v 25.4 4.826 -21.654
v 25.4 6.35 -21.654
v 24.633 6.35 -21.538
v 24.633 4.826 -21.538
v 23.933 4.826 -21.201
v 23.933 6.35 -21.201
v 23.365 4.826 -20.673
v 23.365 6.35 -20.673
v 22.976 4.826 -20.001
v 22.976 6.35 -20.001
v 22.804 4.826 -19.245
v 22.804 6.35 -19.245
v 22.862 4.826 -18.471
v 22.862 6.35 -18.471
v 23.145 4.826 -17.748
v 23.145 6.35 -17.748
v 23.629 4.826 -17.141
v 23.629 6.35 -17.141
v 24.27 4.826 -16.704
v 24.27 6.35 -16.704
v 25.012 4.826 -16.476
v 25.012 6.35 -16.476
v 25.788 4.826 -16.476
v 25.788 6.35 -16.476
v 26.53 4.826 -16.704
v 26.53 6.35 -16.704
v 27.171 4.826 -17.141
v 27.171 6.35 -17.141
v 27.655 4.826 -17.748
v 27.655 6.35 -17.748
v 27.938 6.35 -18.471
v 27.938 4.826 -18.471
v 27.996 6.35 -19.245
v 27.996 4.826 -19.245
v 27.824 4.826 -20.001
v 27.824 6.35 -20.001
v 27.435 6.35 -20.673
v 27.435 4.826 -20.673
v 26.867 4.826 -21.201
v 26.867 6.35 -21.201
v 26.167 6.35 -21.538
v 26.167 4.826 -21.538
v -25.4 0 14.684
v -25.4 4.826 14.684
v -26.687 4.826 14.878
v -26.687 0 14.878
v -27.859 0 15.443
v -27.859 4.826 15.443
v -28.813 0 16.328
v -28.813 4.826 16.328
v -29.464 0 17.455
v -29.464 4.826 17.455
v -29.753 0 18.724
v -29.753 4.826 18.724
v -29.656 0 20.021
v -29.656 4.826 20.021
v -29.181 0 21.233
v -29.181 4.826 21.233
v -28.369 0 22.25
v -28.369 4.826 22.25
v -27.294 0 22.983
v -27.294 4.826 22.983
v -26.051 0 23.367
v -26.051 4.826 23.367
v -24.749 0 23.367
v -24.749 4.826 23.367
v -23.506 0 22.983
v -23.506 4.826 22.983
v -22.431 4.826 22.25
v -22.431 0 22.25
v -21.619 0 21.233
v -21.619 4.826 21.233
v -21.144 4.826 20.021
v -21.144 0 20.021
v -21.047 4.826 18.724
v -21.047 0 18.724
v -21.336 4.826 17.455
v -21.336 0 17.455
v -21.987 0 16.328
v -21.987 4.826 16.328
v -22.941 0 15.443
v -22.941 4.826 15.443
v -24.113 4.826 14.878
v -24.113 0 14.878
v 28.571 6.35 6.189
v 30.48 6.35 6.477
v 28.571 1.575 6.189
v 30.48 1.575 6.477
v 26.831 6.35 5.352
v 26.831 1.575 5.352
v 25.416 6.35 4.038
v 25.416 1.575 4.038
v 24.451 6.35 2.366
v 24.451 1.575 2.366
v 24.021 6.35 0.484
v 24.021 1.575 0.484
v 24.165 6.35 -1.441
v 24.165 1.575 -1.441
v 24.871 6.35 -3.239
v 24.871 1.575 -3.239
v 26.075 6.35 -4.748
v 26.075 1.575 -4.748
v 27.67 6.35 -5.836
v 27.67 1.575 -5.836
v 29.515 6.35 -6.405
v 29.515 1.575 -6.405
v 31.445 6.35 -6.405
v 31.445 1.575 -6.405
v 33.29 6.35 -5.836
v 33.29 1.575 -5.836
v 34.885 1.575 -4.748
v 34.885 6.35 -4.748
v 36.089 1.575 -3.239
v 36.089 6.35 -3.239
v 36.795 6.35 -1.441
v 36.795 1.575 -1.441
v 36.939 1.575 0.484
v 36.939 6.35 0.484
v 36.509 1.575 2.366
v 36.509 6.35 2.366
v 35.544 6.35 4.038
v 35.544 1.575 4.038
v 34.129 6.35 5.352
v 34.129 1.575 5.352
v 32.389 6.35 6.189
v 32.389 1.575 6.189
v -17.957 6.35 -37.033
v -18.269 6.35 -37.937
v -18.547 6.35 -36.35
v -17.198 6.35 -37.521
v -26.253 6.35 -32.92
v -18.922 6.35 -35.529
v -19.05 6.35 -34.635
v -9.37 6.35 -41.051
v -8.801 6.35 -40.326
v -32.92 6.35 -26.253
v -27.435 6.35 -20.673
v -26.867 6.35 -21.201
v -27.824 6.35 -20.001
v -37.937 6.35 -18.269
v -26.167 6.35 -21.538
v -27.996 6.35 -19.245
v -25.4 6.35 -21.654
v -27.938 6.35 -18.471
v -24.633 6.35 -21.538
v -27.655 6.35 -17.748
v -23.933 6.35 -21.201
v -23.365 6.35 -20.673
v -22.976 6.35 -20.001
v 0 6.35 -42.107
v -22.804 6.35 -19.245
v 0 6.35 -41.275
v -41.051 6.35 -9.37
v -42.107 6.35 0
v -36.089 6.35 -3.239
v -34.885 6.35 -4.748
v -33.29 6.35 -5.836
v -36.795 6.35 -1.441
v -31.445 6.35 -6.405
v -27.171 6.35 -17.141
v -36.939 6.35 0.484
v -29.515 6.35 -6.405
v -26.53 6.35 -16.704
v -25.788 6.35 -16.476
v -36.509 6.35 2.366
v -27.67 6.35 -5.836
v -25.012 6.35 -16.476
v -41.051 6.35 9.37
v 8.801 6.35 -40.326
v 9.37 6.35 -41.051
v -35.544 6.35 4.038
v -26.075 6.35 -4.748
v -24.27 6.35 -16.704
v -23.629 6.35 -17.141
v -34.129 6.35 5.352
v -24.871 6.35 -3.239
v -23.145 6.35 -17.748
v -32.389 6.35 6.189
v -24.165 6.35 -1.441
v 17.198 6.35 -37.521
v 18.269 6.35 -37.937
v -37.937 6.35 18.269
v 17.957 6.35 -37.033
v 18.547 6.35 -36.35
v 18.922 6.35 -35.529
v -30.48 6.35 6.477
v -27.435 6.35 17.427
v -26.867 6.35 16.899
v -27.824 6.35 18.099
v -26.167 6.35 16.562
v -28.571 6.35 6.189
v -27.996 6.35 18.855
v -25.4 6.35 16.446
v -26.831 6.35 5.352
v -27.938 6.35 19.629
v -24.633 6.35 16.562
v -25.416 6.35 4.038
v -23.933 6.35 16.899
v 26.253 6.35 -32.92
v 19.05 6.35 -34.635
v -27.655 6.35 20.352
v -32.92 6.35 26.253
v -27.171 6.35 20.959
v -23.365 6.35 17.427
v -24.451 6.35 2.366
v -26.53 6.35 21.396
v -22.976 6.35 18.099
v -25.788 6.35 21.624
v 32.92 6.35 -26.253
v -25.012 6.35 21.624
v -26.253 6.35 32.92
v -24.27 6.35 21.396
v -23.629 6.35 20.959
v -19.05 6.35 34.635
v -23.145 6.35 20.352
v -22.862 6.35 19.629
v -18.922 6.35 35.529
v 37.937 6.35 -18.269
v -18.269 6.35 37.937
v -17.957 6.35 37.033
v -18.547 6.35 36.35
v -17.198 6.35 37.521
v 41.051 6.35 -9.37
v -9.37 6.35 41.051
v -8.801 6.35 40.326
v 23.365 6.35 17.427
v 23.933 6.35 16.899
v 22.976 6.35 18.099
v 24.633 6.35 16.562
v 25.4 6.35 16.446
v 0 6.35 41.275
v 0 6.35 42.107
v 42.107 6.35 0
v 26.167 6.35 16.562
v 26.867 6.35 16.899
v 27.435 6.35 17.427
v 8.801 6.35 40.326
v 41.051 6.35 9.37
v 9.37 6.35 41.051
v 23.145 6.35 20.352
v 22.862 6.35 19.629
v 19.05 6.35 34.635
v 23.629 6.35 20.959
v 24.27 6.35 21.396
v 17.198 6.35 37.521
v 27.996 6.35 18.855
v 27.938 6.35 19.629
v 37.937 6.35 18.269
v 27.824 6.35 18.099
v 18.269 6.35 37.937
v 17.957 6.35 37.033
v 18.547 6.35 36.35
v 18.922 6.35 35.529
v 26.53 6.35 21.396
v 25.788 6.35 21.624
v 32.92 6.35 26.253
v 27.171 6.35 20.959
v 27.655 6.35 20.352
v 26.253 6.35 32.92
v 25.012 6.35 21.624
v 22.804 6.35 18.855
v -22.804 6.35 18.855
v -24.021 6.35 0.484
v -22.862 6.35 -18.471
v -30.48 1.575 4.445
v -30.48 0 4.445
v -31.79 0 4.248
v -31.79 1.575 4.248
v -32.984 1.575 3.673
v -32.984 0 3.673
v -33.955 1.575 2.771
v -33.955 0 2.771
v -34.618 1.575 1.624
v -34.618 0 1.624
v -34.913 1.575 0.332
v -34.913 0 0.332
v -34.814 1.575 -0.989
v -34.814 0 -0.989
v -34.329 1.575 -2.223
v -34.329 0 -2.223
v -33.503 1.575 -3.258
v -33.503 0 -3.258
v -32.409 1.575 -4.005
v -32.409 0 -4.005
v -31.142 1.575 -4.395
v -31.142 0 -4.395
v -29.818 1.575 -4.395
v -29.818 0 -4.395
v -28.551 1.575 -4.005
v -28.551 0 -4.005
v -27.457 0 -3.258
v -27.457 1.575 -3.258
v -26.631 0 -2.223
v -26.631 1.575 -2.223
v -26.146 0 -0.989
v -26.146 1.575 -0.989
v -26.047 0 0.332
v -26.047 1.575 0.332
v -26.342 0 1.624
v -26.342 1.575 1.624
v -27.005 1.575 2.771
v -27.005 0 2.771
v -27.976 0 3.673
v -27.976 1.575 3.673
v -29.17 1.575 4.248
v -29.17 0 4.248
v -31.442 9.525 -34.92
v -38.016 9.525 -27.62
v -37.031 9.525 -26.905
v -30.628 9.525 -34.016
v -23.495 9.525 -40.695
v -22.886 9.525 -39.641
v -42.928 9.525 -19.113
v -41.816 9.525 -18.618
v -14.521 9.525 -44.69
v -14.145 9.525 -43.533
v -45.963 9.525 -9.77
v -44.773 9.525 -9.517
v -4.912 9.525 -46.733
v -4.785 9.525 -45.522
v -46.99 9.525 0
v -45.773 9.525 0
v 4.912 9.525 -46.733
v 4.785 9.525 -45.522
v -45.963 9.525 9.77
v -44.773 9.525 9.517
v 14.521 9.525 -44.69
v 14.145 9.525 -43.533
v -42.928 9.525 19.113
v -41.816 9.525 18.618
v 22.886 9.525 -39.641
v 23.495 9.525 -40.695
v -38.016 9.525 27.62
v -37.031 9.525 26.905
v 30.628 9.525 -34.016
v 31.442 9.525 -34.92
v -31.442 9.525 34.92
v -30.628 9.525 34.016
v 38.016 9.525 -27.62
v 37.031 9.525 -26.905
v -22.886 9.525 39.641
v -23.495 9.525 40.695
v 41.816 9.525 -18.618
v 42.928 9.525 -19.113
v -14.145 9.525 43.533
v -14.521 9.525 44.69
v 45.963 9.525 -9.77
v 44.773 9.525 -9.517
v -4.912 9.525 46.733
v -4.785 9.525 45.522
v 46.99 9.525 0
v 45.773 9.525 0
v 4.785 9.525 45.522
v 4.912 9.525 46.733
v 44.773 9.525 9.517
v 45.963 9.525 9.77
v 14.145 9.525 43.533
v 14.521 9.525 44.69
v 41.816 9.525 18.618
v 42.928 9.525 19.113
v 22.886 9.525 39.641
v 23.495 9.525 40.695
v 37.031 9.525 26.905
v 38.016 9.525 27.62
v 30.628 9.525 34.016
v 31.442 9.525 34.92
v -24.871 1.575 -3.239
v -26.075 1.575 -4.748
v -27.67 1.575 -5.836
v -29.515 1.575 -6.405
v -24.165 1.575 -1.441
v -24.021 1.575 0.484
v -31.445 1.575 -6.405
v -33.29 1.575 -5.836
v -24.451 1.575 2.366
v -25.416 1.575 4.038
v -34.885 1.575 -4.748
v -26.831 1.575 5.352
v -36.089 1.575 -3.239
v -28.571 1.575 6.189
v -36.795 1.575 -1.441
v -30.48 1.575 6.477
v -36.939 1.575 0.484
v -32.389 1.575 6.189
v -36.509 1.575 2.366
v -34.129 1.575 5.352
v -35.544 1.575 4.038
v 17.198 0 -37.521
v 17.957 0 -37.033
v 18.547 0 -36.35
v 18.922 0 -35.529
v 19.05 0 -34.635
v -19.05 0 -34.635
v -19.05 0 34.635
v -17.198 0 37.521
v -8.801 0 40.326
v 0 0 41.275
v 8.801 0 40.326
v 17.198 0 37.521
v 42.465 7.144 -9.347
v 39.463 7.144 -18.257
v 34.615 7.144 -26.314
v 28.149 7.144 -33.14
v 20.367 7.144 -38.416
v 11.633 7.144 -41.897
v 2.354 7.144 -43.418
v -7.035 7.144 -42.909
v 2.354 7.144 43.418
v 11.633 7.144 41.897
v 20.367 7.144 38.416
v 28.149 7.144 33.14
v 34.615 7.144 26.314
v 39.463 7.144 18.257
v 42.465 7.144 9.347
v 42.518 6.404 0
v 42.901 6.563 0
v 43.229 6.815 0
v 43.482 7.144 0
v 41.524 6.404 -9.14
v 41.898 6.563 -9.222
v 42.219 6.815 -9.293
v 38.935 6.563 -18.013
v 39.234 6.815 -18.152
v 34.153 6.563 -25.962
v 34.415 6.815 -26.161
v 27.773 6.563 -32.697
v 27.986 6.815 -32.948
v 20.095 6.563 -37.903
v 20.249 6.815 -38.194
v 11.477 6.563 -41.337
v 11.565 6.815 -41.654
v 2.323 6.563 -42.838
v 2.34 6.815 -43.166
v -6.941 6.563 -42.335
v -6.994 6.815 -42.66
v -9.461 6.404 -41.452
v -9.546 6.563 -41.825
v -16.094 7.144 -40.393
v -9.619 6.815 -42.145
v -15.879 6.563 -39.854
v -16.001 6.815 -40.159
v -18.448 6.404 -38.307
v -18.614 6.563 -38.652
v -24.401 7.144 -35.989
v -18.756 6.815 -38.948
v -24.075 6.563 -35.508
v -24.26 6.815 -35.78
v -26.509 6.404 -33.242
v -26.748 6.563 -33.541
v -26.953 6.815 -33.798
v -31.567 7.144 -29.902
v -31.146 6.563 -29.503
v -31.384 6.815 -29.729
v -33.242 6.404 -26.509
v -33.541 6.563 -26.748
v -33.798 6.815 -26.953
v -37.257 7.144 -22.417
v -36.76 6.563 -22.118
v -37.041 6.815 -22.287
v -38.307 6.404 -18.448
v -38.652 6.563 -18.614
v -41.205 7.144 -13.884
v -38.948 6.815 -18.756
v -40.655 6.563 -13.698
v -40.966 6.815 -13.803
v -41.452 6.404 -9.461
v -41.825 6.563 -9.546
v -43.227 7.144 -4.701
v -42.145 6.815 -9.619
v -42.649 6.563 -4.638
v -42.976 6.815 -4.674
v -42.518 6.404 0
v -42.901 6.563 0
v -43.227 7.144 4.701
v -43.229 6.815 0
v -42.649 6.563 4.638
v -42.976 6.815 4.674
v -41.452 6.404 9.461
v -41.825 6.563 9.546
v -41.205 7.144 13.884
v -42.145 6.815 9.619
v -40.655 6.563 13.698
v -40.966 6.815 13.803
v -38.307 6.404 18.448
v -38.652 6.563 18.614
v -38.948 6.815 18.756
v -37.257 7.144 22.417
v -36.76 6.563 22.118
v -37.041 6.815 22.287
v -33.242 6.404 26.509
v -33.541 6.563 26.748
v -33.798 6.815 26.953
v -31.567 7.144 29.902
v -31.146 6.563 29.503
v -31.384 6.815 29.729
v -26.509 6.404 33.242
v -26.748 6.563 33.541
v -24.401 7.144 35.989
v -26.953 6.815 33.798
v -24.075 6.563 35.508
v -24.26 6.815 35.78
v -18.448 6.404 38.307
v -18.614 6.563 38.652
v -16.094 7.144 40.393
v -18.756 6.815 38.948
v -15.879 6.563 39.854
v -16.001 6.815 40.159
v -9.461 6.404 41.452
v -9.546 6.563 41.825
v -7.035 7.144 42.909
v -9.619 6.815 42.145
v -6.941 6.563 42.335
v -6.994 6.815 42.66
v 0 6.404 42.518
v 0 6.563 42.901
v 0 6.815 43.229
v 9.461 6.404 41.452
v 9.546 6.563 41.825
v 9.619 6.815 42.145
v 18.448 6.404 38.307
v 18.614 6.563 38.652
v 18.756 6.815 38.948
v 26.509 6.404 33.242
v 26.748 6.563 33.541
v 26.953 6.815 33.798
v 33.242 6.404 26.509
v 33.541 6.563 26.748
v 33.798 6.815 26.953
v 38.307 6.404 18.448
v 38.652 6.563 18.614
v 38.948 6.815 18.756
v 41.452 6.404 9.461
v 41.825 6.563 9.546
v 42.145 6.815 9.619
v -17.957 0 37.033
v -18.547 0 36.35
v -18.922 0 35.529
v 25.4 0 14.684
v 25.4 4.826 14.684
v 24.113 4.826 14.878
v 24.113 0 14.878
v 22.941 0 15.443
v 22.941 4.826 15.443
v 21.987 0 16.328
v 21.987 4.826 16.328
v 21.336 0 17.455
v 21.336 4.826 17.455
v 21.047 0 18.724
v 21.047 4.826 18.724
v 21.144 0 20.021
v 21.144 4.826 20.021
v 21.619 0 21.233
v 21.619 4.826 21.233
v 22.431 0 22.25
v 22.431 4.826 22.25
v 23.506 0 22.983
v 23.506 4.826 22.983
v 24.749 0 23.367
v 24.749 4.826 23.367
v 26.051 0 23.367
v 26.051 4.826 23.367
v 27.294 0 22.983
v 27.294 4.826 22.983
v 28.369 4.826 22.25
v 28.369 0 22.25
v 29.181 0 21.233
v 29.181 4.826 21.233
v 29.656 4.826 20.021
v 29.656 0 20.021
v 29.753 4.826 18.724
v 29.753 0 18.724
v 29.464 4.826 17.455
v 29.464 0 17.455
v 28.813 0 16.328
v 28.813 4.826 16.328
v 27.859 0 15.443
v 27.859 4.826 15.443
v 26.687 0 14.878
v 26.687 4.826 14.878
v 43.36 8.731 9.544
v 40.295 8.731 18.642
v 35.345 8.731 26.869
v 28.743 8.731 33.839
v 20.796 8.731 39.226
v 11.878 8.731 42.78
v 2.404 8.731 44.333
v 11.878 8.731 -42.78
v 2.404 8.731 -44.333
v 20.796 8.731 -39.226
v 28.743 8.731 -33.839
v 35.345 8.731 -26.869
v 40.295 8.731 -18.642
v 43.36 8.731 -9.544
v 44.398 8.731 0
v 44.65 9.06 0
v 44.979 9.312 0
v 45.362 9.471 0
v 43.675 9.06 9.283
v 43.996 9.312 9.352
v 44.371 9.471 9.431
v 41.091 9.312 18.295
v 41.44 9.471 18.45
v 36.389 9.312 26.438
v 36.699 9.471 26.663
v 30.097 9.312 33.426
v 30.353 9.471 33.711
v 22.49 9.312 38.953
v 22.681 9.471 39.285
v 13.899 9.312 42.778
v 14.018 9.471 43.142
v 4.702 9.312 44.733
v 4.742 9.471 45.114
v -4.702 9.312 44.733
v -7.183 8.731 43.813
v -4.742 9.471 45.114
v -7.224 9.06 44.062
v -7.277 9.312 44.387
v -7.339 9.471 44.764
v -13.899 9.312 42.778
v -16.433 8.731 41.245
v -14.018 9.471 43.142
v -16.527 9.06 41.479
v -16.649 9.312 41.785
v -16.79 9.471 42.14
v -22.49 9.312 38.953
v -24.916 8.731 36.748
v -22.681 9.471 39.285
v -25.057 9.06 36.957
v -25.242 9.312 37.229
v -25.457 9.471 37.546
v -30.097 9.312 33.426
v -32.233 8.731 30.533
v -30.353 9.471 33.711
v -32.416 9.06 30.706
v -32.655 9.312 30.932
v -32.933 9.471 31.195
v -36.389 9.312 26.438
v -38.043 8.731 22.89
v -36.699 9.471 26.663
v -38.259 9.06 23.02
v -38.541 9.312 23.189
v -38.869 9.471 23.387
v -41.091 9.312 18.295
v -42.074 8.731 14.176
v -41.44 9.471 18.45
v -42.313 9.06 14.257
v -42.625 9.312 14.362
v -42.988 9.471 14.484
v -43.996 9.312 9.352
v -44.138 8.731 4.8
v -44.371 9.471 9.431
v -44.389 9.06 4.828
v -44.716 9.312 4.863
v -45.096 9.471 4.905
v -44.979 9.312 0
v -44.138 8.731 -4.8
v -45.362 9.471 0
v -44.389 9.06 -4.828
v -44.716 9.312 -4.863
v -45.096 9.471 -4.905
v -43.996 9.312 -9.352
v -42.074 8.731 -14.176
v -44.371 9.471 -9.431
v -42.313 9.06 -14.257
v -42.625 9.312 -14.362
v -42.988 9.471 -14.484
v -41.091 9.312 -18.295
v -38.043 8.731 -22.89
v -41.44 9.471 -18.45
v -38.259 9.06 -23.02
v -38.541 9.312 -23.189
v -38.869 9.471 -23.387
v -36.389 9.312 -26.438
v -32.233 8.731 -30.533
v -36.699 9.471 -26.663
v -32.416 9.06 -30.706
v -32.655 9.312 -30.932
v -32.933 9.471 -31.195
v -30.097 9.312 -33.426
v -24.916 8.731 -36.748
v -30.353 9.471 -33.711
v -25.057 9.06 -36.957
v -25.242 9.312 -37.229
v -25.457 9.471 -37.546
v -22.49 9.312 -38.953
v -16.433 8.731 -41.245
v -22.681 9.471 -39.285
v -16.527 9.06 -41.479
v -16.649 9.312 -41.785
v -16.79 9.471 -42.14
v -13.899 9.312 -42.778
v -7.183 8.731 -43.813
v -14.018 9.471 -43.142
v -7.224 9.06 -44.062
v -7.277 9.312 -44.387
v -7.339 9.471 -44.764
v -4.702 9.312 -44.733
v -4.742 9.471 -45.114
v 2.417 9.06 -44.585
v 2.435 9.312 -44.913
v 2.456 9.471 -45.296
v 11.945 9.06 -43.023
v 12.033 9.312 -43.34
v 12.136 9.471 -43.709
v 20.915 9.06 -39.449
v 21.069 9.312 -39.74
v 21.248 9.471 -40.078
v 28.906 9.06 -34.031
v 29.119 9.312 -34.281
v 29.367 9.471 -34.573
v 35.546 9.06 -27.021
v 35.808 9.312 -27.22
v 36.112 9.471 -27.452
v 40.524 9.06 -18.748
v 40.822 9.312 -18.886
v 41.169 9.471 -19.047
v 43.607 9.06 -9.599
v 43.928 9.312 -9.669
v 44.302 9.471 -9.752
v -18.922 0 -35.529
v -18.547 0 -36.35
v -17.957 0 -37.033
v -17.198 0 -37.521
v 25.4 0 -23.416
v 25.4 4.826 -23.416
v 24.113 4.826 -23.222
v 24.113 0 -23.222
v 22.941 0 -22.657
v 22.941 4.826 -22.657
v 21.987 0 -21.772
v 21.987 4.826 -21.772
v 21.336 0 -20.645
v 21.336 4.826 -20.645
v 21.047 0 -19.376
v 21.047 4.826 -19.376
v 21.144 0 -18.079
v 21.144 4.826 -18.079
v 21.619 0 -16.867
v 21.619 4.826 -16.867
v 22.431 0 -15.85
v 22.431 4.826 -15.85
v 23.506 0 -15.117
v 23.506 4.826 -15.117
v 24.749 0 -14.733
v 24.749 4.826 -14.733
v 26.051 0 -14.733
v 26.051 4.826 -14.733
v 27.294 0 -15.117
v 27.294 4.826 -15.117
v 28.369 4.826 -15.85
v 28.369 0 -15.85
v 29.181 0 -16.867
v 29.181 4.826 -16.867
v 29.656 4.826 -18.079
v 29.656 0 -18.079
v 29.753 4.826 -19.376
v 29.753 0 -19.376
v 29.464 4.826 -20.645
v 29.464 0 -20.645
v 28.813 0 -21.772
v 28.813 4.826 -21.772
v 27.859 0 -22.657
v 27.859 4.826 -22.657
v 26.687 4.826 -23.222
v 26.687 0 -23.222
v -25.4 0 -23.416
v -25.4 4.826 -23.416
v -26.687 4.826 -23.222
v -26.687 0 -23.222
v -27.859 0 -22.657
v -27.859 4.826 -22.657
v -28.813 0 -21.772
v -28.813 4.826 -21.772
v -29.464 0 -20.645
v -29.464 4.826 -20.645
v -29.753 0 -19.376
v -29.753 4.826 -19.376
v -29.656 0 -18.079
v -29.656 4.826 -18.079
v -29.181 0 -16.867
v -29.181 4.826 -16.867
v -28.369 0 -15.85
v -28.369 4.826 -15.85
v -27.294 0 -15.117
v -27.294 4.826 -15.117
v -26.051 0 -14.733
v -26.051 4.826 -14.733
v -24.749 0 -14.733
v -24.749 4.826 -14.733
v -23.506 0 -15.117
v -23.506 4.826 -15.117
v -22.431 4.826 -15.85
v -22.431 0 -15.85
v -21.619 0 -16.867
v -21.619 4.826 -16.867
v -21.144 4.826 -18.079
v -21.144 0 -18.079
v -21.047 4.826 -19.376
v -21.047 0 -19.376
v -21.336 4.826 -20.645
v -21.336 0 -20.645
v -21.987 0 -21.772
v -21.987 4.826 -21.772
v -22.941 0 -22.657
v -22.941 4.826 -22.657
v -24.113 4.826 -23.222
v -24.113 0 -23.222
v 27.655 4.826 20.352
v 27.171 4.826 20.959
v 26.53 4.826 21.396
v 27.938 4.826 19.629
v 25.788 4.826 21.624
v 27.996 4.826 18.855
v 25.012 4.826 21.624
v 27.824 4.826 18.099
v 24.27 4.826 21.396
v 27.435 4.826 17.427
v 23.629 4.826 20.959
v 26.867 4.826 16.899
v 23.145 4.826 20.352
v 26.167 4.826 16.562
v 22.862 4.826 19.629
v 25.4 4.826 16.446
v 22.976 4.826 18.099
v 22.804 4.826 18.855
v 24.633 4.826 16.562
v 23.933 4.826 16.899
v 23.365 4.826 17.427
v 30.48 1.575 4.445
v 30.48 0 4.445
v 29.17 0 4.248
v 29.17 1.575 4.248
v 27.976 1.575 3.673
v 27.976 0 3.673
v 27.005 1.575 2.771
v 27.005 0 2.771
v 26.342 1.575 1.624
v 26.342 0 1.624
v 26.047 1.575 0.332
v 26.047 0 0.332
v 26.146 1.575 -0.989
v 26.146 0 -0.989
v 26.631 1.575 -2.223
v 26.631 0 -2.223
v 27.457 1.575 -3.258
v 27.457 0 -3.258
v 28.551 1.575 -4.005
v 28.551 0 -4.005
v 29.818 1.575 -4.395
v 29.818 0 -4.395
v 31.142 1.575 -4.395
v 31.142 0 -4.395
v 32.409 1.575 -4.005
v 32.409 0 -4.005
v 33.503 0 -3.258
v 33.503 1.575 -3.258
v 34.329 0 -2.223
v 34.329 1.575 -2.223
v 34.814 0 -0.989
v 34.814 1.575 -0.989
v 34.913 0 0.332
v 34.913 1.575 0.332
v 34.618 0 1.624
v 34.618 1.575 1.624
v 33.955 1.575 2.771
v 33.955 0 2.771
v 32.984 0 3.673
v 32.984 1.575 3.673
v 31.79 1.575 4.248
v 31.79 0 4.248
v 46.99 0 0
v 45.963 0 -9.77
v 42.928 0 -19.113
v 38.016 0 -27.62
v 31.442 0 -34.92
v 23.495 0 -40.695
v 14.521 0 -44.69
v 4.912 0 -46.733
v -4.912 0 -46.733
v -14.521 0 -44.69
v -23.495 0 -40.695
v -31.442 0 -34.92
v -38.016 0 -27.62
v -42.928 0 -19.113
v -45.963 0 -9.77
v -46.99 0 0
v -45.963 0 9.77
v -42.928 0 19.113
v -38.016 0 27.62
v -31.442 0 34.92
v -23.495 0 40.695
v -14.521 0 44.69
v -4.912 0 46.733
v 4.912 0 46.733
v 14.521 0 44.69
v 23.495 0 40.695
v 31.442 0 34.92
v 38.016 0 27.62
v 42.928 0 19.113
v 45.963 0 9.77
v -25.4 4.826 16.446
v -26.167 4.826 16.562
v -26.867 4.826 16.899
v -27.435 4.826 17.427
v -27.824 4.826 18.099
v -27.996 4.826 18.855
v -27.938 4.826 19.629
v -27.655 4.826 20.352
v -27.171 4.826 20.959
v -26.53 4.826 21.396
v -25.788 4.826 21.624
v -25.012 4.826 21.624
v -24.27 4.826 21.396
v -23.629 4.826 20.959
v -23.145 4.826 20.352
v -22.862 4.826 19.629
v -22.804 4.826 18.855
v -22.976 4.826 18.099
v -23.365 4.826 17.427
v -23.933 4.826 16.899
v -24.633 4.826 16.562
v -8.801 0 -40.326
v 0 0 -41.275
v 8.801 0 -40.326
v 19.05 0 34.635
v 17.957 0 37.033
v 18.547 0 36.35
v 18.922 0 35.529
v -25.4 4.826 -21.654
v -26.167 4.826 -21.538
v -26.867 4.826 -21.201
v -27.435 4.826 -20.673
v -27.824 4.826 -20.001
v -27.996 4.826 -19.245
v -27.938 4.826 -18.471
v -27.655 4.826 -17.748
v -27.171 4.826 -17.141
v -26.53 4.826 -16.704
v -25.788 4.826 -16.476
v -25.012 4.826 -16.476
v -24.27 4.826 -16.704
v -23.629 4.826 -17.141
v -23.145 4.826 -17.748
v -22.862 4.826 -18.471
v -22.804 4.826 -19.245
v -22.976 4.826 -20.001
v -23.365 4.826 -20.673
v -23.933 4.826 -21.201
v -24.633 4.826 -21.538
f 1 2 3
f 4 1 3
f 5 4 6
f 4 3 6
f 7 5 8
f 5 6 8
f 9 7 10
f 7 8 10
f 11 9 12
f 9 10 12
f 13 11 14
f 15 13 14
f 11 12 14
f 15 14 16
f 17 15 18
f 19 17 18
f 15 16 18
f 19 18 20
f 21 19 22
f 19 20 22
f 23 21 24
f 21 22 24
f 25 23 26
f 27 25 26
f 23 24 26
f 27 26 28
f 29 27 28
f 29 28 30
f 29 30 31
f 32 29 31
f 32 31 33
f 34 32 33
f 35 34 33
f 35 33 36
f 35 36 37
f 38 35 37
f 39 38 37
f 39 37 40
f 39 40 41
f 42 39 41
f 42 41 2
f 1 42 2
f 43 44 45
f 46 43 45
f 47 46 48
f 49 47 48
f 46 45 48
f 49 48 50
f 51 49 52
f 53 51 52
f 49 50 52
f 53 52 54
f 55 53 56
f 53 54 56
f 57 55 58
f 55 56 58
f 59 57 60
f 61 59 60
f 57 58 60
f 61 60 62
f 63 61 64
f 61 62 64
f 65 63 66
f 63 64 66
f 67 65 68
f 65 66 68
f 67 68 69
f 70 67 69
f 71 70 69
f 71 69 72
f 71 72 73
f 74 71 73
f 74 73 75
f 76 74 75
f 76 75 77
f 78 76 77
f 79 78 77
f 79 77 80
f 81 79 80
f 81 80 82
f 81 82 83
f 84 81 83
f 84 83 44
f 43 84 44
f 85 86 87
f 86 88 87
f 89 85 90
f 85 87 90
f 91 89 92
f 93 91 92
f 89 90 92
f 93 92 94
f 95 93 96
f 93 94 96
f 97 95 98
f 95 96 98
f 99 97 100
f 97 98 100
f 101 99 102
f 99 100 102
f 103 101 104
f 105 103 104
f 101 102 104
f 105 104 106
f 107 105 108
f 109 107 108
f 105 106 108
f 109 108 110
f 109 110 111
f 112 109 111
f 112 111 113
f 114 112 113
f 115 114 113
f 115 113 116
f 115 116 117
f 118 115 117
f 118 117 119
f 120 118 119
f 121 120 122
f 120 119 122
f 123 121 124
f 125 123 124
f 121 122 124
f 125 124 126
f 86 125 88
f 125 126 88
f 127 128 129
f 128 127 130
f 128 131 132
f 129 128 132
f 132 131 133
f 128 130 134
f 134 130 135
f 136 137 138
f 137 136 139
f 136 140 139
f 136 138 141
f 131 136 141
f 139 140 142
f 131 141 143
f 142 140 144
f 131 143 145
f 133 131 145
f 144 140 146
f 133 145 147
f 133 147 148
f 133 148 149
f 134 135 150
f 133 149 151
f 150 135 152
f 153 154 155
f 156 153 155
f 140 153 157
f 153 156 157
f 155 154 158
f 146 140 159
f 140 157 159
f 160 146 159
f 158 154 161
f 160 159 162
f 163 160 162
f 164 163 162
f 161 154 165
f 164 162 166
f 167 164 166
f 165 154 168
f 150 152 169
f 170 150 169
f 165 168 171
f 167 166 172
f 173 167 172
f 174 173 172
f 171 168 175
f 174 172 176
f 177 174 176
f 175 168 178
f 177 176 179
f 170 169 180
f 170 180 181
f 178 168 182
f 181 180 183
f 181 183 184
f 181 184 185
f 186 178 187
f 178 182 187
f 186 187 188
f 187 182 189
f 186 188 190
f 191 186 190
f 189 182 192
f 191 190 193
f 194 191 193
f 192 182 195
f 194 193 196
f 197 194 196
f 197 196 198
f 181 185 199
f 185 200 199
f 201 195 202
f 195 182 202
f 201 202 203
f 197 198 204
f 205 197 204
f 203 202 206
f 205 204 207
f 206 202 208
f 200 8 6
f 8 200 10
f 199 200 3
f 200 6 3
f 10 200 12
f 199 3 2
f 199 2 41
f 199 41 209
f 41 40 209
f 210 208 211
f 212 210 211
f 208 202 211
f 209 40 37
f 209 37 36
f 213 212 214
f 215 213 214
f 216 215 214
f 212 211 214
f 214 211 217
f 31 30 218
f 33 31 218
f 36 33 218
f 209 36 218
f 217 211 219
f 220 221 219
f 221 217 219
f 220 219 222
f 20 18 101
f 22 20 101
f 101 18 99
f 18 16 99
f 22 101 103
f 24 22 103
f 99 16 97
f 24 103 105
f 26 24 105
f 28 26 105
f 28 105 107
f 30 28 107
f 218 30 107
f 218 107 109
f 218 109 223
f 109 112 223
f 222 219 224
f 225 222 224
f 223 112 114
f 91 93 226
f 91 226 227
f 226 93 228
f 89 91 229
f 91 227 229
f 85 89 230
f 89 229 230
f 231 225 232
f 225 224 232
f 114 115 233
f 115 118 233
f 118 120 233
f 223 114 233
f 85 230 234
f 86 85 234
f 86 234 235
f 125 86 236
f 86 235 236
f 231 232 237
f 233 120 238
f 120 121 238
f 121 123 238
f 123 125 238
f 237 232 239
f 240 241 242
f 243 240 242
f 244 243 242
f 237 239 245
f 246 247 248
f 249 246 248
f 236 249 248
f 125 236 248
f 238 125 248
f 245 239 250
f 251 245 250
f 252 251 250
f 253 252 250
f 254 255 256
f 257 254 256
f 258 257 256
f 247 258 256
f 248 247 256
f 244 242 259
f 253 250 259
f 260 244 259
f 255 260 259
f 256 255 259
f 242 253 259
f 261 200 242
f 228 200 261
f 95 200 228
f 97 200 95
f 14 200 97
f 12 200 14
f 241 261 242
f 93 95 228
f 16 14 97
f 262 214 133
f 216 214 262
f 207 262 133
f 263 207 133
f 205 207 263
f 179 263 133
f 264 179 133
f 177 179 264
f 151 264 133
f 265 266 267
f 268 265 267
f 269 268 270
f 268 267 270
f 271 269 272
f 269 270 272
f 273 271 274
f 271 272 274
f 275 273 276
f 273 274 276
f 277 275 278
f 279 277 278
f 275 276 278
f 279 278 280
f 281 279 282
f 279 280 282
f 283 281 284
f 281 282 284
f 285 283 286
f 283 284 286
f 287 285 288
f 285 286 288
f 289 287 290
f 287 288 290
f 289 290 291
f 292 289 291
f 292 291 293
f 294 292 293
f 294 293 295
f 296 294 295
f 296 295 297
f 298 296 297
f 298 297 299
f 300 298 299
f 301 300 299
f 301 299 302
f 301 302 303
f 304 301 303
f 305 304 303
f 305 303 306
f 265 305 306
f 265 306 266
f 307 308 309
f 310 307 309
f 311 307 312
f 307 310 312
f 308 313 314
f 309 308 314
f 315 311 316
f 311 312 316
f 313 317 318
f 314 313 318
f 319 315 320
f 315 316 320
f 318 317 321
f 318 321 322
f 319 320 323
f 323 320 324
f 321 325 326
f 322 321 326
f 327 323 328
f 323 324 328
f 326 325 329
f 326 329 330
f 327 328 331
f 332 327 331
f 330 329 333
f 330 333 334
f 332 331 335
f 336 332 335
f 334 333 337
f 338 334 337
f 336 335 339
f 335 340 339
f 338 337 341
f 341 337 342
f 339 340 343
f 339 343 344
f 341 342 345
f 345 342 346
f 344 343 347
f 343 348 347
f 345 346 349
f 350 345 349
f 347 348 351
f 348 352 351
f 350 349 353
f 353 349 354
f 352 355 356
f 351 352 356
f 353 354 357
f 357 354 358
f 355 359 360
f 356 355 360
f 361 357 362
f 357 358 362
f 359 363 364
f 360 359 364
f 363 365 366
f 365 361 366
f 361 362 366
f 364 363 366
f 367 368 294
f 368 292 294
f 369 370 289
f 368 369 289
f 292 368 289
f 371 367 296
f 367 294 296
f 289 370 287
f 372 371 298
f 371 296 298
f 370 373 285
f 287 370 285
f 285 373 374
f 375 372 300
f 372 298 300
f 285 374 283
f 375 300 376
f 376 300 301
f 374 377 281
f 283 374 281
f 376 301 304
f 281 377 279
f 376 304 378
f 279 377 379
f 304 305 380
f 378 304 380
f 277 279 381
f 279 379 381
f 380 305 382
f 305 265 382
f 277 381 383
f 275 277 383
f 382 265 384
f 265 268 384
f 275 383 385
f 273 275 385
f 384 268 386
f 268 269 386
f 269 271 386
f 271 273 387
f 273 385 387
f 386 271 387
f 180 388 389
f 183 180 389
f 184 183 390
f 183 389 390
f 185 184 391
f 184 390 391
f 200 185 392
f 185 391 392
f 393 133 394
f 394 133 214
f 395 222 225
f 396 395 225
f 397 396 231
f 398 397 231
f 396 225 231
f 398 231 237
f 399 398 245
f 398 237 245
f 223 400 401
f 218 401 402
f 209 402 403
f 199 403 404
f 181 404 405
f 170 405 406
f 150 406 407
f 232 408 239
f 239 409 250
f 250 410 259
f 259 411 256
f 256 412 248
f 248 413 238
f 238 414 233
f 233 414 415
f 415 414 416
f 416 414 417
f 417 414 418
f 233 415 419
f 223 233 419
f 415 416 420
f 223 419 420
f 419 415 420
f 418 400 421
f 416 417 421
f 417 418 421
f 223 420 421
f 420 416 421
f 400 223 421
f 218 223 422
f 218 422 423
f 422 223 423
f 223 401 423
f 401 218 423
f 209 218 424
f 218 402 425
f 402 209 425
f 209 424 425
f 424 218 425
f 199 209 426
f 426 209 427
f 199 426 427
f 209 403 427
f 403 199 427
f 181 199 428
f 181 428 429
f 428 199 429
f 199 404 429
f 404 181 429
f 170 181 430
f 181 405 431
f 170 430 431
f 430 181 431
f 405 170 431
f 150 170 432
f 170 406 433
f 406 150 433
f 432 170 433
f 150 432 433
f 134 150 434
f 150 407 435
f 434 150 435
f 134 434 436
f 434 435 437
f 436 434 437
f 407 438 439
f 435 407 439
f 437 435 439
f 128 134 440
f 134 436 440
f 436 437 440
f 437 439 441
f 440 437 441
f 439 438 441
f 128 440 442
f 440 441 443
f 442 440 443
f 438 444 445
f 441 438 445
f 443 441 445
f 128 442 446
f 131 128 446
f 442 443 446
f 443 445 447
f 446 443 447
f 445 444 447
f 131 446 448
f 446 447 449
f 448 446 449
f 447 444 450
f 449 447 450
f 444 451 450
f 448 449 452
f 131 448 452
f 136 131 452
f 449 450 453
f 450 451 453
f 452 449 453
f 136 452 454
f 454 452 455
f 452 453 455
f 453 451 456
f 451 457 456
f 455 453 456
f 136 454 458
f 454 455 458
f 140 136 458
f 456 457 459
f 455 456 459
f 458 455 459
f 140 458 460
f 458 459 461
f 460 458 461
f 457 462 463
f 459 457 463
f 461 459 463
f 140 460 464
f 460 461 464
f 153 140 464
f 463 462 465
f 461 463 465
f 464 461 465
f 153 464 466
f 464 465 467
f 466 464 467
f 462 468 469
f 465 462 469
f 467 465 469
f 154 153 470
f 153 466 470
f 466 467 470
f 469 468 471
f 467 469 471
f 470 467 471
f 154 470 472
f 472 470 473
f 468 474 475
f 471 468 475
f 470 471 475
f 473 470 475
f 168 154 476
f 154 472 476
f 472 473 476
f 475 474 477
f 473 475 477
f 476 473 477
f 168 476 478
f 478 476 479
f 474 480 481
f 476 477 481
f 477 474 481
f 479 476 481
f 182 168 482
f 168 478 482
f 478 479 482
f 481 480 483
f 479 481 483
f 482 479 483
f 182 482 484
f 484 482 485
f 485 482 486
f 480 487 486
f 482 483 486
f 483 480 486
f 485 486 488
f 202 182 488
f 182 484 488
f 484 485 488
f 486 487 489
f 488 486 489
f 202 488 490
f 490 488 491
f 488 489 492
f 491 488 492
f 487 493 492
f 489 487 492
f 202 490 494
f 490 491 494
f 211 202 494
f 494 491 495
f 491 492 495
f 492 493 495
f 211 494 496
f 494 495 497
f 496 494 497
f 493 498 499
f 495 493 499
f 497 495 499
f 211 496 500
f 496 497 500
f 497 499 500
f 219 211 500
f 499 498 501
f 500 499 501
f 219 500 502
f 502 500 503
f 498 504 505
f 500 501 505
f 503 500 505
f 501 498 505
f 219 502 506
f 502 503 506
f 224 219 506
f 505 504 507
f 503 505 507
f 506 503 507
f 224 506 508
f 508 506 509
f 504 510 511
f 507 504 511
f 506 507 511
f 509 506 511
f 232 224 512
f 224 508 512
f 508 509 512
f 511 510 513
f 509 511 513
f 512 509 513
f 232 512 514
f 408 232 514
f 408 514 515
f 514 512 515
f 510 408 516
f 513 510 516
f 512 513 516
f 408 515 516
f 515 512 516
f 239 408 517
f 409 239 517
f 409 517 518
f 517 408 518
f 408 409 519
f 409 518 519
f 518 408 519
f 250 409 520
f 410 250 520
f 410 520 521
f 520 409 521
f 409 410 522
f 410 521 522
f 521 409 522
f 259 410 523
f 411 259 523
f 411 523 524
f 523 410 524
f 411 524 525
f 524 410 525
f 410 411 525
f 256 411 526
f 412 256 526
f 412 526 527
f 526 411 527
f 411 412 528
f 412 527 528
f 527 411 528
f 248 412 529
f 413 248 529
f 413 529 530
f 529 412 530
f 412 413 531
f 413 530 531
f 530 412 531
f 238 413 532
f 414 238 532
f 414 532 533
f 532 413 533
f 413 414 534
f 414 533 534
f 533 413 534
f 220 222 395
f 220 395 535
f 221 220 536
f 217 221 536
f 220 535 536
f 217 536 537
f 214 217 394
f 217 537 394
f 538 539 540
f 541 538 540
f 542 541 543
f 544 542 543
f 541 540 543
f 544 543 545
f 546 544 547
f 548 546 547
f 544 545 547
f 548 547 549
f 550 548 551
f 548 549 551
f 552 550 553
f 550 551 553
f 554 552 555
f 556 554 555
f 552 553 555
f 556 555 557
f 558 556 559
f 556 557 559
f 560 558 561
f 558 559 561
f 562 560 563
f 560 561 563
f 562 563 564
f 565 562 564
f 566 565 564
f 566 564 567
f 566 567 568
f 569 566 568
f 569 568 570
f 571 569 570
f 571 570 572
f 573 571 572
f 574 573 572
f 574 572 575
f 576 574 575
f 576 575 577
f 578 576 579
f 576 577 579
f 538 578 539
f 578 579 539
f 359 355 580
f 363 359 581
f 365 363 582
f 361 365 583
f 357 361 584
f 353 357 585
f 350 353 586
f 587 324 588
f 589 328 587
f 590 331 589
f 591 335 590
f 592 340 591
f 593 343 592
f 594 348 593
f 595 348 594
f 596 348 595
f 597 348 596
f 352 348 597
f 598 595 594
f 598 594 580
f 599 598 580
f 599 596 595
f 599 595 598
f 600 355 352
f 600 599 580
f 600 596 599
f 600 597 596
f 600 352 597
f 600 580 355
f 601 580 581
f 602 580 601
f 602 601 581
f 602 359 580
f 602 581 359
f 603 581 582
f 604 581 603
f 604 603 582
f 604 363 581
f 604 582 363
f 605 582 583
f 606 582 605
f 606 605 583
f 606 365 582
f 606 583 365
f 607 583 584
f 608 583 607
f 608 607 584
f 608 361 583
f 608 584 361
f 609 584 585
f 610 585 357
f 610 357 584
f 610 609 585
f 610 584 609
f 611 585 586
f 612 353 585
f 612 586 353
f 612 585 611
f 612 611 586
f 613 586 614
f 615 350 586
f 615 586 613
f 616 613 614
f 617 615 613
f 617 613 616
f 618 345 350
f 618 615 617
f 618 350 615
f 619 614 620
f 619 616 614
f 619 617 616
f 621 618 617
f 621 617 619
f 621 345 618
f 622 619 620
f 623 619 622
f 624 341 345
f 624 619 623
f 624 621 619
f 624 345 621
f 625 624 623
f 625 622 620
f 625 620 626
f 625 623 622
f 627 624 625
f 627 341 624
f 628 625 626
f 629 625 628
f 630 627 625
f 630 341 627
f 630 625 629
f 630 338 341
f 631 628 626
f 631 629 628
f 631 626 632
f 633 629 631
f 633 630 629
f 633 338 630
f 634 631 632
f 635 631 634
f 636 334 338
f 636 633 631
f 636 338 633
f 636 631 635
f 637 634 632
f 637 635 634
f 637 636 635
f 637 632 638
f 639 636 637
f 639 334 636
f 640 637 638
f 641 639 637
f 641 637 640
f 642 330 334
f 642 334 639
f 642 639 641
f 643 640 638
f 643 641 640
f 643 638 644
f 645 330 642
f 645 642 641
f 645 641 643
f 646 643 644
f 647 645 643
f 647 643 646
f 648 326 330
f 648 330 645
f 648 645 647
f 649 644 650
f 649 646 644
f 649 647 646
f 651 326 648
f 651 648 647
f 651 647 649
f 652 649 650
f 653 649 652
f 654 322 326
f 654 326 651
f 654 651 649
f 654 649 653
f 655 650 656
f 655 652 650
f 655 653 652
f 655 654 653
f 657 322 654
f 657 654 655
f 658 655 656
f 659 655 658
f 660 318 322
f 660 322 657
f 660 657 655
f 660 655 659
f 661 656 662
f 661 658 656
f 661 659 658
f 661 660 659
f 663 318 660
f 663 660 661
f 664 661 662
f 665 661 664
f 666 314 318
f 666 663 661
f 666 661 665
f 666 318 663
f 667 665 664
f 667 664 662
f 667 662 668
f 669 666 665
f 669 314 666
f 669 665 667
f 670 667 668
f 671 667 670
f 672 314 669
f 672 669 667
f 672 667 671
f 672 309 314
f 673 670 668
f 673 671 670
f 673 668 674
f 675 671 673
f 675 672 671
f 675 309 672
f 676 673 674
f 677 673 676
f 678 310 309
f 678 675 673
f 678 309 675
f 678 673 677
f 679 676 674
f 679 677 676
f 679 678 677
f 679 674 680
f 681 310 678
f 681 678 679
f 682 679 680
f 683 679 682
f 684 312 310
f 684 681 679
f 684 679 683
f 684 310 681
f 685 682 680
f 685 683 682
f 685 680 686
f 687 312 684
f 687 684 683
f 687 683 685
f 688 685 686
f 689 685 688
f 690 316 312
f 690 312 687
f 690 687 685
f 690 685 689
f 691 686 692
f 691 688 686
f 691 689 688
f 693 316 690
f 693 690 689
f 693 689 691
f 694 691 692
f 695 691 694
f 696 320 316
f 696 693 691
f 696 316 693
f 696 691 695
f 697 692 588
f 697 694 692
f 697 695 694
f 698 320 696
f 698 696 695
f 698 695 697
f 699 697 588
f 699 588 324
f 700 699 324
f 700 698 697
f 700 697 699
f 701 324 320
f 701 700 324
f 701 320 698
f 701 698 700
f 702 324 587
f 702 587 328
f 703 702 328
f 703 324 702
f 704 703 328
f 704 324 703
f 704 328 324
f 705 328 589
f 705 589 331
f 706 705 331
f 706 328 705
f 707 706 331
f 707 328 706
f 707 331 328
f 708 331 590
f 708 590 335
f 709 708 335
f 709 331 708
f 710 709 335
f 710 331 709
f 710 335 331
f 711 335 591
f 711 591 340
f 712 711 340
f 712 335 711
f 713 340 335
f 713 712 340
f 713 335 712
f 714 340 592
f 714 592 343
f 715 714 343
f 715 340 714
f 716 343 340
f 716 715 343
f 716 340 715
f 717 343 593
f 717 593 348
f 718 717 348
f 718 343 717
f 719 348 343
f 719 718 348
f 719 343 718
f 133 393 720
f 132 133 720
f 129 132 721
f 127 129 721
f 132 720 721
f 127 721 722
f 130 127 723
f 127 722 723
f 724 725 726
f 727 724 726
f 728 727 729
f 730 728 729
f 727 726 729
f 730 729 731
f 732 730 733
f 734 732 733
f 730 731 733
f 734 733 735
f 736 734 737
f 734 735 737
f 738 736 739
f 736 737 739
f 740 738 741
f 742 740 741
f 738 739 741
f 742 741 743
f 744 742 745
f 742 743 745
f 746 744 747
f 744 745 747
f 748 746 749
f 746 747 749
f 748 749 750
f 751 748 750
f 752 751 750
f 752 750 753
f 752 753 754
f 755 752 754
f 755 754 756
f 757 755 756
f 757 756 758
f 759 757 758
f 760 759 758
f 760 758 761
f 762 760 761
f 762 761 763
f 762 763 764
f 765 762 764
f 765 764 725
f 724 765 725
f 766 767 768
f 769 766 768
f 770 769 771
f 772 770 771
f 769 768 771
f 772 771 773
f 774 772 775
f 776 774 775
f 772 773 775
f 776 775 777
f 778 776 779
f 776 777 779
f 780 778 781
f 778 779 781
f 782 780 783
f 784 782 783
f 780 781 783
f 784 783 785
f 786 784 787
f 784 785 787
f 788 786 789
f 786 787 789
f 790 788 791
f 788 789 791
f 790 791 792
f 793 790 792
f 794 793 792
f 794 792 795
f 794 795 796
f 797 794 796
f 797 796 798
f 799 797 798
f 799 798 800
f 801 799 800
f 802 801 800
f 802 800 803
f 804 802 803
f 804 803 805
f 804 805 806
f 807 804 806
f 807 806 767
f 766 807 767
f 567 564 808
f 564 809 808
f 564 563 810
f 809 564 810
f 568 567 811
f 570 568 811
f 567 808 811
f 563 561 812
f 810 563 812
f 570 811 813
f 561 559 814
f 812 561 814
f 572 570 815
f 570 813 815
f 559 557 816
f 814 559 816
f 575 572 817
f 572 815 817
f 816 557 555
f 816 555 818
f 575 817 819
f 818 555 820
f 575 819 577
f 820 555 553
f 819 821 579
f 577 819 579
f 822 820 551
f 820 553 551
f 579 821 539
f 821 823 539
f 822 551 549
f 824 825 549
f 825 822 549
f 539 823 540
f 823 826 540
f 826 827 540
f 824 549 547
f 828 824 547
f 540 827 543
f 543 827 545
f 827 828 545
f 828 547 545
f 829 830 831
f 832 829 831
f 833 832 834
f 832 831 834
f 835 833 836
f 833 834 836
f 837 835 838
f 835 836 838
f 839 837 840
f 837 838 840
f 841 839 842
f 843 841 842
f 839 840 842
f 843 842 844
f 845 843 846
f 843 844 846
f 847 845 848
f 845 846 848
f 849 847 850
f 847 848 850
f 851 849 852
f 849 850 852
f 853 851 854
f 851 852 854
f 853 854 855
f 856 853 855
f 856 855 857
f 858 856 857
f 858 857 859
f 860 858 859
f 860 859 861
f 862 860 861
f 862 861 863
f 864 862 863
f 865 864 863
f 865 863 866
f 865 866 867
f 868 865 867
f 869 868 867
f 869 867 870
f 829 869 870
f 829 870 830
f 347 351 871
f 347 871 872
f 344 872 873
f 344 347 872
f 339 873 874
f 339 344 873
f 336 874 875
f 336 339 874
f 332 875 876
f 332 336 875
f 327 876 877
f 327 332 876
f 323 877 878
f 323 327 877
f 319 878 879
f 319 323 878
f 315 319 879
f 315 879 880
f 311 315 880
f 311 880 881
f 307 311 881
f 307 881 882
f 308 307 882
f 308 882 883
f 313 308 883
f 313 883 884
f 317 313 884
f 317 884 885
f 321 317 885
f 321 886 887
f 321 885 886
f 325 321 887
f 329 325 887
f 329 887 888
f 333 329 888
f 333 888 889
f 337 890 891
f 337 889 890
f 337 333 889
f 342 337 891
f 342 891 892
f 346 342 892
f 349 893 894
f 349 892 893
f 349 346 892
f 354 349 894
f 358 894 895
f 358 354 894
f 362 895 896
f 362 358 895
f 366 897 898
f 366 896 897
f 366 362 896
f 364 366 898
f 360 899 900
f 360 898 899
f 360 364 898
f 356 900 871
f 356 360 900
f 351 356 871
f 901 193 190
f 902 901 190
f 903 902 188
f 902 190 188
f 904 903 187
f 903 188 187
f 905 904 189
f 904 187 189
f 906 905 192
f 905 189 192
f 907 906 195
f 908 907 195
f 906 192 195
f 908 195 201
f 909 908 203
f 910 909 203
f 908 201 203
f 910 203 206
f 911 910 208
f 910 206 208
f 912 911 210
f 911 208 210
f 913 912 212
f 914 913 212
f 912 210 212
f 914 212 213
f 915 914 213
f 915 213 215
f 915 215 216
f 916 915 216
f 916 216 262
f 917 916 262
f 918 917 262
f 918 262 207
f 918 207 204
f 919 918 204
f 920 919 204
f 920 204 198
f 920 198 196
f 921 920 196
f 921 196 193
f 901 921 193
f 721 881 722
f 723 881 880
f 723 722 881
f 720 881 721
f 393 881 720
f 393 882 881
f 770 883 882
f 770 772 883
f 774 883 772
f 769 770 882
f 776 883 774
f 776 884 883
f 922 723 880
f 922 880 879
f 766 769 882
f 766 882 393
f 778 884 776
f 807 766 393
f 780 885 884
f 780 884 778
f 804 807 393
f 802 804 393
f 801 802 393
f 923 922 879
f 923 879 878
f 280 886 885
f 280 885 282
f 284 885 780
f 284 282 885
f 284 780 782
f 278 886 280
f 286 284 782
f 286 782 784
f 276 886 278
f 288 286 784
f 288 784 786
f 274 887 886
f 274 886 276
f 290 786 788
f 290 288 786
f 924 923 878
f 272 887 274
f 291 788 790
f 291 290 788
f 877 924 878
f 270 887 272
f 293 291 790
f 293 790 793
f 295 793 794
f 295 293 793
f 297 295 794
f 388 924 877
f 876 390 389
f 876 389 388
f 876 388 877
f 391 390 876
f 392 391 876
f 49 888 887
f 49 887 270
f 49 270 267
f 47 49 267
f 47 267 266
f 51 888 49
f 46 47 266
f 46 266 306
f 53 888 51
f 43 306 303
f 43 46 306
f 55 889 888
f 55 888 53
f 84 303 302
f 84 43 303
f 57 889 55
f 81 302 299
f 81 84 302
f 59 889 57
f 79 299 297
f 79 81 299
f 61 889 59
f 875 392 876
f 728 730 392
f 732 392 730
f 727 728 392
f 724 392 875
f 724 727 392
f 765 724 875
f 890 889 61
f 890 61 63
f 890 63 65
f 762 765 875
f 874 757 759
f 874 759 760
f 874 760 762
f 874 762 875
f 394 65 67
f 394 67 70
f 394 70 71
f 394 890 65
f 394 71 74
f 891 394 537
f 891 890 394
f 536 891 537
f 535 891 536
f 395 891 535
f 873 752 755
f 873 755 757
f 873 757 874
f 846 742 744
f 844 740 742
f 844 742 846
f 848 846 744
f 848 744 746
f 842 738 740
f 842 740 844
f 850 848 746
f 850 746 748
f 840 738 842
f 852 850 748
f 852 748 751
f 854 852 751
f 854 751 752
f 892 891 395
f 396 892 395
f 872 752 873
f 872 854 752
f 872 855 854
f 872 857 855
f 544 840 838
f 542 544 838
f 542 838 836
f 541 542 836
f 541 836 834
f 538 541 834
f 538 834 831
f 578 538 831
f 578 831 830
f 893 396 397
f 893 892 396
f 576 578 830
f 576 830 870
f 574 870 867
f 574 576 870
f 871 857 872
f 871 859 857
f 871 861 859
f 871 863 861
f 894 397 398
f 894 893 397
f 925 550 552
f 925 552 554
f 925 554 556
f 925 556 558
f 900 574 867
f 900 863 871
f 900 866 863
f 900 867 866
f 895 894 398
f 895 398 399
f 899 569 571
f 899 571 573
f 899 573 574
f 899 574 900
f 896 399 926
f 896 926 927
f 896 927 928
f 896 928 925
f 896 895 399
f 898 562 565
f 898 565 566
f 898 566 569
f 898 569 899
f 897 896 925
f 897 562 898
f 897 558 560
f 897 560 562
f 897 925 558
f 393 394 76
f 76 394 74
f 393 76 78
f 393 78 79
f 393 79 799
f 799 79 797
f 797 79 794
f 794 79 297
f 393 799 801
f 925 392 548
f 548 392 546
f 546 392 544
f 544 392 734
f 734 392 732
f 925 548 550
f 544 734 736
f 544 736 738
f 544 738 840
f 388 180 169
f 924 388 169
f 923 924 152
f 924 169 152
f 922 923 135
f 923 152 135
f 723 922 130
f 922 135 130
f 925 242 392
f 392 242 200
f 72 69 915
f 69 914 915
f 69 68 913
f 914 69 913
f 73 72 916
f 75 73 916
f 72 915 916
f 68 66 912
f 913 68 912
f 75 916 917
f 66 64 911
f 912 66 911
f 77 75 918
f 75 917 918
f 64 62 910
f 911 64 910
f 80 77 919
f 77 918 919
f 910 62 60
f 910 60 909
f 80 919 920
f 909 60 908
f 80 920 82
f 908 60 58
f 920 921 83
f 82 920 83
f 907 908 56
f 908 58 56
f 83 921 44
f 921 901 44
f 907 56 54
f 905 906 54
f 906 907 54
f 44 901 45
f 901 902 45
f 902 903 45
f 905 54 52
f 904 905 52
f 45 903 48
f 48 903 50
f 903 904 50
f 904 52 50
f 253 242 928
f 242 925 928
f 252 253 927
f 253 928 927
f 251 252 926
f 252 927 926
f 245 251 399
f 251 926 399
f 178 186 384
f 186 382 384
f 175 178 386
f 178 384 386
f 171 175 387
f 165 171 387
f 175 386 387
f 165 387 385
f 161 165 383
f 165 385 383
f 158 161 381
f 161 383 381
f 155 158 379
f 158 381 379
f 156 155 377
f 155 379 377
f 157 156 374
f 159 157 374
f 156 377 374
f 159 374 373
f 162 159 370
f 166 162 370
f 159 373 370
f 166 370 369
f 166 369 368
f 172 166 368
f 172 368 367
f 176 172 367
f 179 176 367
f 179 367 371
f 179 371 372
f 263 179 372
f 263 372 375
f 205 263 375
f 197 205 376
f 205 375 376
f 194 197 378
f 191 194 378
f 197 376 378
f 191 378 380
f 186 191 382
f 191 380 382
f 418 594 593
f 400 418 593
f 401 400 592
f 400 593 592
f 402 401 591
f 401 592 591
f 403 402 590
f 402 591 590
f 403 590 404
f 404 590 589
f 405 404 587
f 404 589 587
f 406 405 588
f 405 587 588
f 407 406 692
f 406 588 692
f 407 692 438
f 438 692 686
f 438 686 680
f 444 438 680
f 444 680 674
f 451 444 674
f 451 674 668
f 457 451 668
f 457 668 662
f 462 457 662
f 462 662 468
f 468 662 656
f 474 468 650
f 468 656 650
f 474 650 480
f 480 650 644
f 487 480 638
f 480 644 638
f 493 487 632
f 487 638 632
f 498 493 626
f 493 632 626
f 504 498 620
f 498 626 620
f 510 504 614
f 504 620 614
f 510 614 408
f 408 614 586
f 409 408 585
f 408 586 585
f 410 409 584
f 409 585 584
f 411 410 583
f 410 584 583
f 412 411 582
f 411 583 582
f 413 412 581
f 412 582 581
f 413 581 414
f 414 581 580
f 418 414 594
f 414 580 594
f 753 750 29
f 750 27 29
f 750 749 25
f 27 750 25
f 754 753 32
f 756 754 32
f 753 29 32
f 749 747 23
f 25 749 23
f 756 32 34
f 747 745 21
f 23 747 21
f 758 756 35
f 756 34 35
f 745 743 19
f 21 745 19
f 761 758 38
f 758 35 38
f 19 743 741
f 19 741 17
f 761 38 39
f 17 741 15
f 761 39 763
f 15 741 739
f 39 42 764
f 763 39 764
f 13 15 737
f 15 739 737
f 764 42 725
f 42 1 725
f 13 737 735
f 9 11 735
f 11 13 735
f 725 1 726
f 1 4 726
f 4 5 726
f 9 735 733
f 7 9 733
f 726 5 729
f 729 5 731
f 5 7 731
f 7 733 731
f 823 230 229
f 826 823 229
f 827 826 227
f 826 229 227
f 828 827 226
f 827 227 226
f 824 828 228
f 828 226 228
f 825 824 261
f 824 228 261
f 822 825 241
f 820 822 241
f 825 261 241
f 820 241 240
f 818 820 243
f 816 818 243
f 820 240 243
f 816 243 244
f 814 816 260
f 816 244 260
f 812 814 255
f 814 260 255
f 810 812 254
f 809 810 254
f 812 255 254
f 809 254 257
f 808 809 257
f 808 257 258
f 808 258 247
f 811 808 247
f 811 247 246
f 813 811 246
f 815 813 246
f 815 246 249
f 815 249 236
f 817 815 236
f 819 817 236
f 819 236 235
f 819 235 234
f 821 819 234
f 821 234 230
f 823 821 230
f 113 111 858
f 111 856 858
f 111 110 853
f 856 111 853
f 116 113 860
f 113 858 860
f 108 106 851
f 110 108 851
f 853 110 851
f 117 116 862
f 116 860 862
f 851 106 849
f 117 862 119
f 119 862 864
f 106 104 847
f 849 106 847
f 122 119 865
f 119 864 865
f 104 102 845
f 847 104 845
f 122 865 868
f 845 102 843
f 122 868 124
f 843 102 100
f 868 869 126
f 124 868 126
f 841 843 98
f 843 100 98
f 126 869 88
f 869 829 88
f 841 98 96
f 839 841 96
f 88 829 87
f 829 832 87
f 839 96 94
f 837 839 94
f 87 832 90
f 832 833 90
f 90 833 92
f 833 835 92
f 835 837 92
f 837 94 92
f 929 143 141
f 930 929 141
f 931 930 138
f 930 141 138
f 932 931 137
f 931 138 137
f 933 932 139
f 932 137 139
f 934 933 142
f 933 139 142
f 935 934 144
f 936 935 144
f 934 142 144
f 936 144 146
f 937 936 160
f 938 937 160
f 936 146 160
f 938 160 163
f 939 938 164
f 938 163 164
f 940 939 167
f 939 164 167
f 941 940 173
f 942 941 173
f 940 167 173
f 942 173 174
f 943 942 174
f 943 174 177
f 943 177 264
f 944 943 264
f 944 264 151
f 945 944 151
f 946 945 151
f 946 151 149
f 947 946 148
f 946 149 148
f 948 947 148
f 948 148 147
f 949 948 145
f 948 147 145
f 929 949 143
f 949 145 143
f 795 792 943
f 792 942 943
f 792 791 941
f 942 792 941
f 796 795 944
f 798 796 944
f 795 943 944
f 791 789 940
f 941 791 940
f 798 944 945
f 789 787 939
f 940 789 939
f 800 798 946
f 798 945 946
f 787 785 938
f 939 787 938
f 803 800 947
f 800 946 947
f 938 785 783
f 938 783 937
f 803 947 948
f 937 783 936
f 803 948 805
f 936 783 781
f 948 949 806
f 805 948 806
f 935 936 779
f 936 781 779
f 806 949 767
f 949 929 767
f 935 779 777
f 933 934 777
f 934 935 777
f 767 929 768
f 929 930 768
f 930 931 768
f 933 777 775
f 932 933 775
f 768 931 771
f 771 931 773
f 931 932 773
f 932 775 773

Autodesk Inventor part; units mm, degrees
ref_plane "YZ Plane" through (0, 0, 0) normal (1, 0, 0) x (0, 1, 0)
ref_plane "XZ Plane" through (0, 0, 0) normal (0, 1, 0) x (-1, 0, 0)
ref_plane "XY Plane" through (0, 0, 0) normal (0, 0, 1) x (1, 0, 0)
sketch "Sketch1" plane through (0, 0, 0) normal (0, 0, 1) x (1, 0, 0)
  line L0 (0, 0) -> (46.99, 0)
  line L1 (46.99, 0) -> (46.99, 9.525)
  line L2 (46.99, 9.525) -> (44.8564, 9.525)
  line L3 (44.8564, 9.525) -> (43.0233, 6.35)
  line L4 (43.0233, 6.35) -> (0, 6.35)
  line L5 (0, 6.35) -> (0, 0)
  dimension "d0" = 44.8564
  dimension "d2" = 9.525
  dimension "d3" = 60
  dimension "d4" = 46.99
  dimension "d7" = 3.175
revolve "Revolution1" add sketch "Sketch1" angle 360 about axis through (0, 6.35, 0) along (0, -1, 0)
fillet "Fillet1" radius 1.5875 2 edges at (-44.8564, 9.525, 0) (-43.0233, 6.35, 0)
sketch "Sketch2" plane through (0, 6.35, 0) normal (0, 1, 0) x (1, 0, 0)
  circle A0 centre (0, 0) radius 41.275
  line L0 (-19.05, 36.6159) -> (-19.05, -36.6159)
  line L1 (19.05, -36.6159) -> (19.05, 36.6159)
  dimension "d8" = 82.55
  dimension "d9" = 38.1
extrude "Extrusion1" cut sketch "Sketch2" against normal through all contours L1 A0 L0
sketch "Sketch3" plane through (0, 6.35, 0) normal (0, 1, 0) x (1, 0, 0)
  line L0 (0, 0) -> (-30.48, 0) construction
  line L1 (0, 0) -> (30.48, 0) construction
  dimension "d12" = 60.96
hole "Hole1" at (-30.48, 6.35, 0) at (30.48, 6.35, 0) direction (0, -1, 0) diameter 8.89 end through all counterbore diameter 12.954 counterbore depth 4.7752
sketch "Sketch4" plane through (0, 0, 0) normal (0, -1, 0) x (1, 0, 0)
  line L0 (25.4, -19.05) -> (-25.4, -19.05) construction
  line L1 (-25.4, -19.05) -> (-25.4, 19.05) construction
  line L2 (-25.4, 19.05) -> (25.4, 19.05) construction
  line L3 (25.4, 19.05) -> (25.4, -19.05) construction
  line L4 (25.4, -19.05) -> (-25.4, 19.05) construction
  line L5 (25.4, 19.05) -> (-25.4, -19.05) construction
  point P0 (0, 0)
  point P1 (0, 0)
  dimension "d20" = 50.8
  dimension "d21" = 38.1
hole "Hole2" at (25.4, 0, -19.05) at (-25.4, 0, -19.05) at (-25.4, 0, 19.05) at (25.4, 0, 19.05) direction (0, 1, 0) diameter 5.207 end through all counterbore diameter 8.7313 counterbore depth 4.826
fillet "Fillet2" radius 3.175 4 edges at (19.05, 3.175, -36.6159) (19.05, 3.175, 36.6159) (-19.05, 3.175, 36.6159) (-19.05, 3.175, -36.6159)
properties part number "CarriageCap" material "ABS Plastic"
